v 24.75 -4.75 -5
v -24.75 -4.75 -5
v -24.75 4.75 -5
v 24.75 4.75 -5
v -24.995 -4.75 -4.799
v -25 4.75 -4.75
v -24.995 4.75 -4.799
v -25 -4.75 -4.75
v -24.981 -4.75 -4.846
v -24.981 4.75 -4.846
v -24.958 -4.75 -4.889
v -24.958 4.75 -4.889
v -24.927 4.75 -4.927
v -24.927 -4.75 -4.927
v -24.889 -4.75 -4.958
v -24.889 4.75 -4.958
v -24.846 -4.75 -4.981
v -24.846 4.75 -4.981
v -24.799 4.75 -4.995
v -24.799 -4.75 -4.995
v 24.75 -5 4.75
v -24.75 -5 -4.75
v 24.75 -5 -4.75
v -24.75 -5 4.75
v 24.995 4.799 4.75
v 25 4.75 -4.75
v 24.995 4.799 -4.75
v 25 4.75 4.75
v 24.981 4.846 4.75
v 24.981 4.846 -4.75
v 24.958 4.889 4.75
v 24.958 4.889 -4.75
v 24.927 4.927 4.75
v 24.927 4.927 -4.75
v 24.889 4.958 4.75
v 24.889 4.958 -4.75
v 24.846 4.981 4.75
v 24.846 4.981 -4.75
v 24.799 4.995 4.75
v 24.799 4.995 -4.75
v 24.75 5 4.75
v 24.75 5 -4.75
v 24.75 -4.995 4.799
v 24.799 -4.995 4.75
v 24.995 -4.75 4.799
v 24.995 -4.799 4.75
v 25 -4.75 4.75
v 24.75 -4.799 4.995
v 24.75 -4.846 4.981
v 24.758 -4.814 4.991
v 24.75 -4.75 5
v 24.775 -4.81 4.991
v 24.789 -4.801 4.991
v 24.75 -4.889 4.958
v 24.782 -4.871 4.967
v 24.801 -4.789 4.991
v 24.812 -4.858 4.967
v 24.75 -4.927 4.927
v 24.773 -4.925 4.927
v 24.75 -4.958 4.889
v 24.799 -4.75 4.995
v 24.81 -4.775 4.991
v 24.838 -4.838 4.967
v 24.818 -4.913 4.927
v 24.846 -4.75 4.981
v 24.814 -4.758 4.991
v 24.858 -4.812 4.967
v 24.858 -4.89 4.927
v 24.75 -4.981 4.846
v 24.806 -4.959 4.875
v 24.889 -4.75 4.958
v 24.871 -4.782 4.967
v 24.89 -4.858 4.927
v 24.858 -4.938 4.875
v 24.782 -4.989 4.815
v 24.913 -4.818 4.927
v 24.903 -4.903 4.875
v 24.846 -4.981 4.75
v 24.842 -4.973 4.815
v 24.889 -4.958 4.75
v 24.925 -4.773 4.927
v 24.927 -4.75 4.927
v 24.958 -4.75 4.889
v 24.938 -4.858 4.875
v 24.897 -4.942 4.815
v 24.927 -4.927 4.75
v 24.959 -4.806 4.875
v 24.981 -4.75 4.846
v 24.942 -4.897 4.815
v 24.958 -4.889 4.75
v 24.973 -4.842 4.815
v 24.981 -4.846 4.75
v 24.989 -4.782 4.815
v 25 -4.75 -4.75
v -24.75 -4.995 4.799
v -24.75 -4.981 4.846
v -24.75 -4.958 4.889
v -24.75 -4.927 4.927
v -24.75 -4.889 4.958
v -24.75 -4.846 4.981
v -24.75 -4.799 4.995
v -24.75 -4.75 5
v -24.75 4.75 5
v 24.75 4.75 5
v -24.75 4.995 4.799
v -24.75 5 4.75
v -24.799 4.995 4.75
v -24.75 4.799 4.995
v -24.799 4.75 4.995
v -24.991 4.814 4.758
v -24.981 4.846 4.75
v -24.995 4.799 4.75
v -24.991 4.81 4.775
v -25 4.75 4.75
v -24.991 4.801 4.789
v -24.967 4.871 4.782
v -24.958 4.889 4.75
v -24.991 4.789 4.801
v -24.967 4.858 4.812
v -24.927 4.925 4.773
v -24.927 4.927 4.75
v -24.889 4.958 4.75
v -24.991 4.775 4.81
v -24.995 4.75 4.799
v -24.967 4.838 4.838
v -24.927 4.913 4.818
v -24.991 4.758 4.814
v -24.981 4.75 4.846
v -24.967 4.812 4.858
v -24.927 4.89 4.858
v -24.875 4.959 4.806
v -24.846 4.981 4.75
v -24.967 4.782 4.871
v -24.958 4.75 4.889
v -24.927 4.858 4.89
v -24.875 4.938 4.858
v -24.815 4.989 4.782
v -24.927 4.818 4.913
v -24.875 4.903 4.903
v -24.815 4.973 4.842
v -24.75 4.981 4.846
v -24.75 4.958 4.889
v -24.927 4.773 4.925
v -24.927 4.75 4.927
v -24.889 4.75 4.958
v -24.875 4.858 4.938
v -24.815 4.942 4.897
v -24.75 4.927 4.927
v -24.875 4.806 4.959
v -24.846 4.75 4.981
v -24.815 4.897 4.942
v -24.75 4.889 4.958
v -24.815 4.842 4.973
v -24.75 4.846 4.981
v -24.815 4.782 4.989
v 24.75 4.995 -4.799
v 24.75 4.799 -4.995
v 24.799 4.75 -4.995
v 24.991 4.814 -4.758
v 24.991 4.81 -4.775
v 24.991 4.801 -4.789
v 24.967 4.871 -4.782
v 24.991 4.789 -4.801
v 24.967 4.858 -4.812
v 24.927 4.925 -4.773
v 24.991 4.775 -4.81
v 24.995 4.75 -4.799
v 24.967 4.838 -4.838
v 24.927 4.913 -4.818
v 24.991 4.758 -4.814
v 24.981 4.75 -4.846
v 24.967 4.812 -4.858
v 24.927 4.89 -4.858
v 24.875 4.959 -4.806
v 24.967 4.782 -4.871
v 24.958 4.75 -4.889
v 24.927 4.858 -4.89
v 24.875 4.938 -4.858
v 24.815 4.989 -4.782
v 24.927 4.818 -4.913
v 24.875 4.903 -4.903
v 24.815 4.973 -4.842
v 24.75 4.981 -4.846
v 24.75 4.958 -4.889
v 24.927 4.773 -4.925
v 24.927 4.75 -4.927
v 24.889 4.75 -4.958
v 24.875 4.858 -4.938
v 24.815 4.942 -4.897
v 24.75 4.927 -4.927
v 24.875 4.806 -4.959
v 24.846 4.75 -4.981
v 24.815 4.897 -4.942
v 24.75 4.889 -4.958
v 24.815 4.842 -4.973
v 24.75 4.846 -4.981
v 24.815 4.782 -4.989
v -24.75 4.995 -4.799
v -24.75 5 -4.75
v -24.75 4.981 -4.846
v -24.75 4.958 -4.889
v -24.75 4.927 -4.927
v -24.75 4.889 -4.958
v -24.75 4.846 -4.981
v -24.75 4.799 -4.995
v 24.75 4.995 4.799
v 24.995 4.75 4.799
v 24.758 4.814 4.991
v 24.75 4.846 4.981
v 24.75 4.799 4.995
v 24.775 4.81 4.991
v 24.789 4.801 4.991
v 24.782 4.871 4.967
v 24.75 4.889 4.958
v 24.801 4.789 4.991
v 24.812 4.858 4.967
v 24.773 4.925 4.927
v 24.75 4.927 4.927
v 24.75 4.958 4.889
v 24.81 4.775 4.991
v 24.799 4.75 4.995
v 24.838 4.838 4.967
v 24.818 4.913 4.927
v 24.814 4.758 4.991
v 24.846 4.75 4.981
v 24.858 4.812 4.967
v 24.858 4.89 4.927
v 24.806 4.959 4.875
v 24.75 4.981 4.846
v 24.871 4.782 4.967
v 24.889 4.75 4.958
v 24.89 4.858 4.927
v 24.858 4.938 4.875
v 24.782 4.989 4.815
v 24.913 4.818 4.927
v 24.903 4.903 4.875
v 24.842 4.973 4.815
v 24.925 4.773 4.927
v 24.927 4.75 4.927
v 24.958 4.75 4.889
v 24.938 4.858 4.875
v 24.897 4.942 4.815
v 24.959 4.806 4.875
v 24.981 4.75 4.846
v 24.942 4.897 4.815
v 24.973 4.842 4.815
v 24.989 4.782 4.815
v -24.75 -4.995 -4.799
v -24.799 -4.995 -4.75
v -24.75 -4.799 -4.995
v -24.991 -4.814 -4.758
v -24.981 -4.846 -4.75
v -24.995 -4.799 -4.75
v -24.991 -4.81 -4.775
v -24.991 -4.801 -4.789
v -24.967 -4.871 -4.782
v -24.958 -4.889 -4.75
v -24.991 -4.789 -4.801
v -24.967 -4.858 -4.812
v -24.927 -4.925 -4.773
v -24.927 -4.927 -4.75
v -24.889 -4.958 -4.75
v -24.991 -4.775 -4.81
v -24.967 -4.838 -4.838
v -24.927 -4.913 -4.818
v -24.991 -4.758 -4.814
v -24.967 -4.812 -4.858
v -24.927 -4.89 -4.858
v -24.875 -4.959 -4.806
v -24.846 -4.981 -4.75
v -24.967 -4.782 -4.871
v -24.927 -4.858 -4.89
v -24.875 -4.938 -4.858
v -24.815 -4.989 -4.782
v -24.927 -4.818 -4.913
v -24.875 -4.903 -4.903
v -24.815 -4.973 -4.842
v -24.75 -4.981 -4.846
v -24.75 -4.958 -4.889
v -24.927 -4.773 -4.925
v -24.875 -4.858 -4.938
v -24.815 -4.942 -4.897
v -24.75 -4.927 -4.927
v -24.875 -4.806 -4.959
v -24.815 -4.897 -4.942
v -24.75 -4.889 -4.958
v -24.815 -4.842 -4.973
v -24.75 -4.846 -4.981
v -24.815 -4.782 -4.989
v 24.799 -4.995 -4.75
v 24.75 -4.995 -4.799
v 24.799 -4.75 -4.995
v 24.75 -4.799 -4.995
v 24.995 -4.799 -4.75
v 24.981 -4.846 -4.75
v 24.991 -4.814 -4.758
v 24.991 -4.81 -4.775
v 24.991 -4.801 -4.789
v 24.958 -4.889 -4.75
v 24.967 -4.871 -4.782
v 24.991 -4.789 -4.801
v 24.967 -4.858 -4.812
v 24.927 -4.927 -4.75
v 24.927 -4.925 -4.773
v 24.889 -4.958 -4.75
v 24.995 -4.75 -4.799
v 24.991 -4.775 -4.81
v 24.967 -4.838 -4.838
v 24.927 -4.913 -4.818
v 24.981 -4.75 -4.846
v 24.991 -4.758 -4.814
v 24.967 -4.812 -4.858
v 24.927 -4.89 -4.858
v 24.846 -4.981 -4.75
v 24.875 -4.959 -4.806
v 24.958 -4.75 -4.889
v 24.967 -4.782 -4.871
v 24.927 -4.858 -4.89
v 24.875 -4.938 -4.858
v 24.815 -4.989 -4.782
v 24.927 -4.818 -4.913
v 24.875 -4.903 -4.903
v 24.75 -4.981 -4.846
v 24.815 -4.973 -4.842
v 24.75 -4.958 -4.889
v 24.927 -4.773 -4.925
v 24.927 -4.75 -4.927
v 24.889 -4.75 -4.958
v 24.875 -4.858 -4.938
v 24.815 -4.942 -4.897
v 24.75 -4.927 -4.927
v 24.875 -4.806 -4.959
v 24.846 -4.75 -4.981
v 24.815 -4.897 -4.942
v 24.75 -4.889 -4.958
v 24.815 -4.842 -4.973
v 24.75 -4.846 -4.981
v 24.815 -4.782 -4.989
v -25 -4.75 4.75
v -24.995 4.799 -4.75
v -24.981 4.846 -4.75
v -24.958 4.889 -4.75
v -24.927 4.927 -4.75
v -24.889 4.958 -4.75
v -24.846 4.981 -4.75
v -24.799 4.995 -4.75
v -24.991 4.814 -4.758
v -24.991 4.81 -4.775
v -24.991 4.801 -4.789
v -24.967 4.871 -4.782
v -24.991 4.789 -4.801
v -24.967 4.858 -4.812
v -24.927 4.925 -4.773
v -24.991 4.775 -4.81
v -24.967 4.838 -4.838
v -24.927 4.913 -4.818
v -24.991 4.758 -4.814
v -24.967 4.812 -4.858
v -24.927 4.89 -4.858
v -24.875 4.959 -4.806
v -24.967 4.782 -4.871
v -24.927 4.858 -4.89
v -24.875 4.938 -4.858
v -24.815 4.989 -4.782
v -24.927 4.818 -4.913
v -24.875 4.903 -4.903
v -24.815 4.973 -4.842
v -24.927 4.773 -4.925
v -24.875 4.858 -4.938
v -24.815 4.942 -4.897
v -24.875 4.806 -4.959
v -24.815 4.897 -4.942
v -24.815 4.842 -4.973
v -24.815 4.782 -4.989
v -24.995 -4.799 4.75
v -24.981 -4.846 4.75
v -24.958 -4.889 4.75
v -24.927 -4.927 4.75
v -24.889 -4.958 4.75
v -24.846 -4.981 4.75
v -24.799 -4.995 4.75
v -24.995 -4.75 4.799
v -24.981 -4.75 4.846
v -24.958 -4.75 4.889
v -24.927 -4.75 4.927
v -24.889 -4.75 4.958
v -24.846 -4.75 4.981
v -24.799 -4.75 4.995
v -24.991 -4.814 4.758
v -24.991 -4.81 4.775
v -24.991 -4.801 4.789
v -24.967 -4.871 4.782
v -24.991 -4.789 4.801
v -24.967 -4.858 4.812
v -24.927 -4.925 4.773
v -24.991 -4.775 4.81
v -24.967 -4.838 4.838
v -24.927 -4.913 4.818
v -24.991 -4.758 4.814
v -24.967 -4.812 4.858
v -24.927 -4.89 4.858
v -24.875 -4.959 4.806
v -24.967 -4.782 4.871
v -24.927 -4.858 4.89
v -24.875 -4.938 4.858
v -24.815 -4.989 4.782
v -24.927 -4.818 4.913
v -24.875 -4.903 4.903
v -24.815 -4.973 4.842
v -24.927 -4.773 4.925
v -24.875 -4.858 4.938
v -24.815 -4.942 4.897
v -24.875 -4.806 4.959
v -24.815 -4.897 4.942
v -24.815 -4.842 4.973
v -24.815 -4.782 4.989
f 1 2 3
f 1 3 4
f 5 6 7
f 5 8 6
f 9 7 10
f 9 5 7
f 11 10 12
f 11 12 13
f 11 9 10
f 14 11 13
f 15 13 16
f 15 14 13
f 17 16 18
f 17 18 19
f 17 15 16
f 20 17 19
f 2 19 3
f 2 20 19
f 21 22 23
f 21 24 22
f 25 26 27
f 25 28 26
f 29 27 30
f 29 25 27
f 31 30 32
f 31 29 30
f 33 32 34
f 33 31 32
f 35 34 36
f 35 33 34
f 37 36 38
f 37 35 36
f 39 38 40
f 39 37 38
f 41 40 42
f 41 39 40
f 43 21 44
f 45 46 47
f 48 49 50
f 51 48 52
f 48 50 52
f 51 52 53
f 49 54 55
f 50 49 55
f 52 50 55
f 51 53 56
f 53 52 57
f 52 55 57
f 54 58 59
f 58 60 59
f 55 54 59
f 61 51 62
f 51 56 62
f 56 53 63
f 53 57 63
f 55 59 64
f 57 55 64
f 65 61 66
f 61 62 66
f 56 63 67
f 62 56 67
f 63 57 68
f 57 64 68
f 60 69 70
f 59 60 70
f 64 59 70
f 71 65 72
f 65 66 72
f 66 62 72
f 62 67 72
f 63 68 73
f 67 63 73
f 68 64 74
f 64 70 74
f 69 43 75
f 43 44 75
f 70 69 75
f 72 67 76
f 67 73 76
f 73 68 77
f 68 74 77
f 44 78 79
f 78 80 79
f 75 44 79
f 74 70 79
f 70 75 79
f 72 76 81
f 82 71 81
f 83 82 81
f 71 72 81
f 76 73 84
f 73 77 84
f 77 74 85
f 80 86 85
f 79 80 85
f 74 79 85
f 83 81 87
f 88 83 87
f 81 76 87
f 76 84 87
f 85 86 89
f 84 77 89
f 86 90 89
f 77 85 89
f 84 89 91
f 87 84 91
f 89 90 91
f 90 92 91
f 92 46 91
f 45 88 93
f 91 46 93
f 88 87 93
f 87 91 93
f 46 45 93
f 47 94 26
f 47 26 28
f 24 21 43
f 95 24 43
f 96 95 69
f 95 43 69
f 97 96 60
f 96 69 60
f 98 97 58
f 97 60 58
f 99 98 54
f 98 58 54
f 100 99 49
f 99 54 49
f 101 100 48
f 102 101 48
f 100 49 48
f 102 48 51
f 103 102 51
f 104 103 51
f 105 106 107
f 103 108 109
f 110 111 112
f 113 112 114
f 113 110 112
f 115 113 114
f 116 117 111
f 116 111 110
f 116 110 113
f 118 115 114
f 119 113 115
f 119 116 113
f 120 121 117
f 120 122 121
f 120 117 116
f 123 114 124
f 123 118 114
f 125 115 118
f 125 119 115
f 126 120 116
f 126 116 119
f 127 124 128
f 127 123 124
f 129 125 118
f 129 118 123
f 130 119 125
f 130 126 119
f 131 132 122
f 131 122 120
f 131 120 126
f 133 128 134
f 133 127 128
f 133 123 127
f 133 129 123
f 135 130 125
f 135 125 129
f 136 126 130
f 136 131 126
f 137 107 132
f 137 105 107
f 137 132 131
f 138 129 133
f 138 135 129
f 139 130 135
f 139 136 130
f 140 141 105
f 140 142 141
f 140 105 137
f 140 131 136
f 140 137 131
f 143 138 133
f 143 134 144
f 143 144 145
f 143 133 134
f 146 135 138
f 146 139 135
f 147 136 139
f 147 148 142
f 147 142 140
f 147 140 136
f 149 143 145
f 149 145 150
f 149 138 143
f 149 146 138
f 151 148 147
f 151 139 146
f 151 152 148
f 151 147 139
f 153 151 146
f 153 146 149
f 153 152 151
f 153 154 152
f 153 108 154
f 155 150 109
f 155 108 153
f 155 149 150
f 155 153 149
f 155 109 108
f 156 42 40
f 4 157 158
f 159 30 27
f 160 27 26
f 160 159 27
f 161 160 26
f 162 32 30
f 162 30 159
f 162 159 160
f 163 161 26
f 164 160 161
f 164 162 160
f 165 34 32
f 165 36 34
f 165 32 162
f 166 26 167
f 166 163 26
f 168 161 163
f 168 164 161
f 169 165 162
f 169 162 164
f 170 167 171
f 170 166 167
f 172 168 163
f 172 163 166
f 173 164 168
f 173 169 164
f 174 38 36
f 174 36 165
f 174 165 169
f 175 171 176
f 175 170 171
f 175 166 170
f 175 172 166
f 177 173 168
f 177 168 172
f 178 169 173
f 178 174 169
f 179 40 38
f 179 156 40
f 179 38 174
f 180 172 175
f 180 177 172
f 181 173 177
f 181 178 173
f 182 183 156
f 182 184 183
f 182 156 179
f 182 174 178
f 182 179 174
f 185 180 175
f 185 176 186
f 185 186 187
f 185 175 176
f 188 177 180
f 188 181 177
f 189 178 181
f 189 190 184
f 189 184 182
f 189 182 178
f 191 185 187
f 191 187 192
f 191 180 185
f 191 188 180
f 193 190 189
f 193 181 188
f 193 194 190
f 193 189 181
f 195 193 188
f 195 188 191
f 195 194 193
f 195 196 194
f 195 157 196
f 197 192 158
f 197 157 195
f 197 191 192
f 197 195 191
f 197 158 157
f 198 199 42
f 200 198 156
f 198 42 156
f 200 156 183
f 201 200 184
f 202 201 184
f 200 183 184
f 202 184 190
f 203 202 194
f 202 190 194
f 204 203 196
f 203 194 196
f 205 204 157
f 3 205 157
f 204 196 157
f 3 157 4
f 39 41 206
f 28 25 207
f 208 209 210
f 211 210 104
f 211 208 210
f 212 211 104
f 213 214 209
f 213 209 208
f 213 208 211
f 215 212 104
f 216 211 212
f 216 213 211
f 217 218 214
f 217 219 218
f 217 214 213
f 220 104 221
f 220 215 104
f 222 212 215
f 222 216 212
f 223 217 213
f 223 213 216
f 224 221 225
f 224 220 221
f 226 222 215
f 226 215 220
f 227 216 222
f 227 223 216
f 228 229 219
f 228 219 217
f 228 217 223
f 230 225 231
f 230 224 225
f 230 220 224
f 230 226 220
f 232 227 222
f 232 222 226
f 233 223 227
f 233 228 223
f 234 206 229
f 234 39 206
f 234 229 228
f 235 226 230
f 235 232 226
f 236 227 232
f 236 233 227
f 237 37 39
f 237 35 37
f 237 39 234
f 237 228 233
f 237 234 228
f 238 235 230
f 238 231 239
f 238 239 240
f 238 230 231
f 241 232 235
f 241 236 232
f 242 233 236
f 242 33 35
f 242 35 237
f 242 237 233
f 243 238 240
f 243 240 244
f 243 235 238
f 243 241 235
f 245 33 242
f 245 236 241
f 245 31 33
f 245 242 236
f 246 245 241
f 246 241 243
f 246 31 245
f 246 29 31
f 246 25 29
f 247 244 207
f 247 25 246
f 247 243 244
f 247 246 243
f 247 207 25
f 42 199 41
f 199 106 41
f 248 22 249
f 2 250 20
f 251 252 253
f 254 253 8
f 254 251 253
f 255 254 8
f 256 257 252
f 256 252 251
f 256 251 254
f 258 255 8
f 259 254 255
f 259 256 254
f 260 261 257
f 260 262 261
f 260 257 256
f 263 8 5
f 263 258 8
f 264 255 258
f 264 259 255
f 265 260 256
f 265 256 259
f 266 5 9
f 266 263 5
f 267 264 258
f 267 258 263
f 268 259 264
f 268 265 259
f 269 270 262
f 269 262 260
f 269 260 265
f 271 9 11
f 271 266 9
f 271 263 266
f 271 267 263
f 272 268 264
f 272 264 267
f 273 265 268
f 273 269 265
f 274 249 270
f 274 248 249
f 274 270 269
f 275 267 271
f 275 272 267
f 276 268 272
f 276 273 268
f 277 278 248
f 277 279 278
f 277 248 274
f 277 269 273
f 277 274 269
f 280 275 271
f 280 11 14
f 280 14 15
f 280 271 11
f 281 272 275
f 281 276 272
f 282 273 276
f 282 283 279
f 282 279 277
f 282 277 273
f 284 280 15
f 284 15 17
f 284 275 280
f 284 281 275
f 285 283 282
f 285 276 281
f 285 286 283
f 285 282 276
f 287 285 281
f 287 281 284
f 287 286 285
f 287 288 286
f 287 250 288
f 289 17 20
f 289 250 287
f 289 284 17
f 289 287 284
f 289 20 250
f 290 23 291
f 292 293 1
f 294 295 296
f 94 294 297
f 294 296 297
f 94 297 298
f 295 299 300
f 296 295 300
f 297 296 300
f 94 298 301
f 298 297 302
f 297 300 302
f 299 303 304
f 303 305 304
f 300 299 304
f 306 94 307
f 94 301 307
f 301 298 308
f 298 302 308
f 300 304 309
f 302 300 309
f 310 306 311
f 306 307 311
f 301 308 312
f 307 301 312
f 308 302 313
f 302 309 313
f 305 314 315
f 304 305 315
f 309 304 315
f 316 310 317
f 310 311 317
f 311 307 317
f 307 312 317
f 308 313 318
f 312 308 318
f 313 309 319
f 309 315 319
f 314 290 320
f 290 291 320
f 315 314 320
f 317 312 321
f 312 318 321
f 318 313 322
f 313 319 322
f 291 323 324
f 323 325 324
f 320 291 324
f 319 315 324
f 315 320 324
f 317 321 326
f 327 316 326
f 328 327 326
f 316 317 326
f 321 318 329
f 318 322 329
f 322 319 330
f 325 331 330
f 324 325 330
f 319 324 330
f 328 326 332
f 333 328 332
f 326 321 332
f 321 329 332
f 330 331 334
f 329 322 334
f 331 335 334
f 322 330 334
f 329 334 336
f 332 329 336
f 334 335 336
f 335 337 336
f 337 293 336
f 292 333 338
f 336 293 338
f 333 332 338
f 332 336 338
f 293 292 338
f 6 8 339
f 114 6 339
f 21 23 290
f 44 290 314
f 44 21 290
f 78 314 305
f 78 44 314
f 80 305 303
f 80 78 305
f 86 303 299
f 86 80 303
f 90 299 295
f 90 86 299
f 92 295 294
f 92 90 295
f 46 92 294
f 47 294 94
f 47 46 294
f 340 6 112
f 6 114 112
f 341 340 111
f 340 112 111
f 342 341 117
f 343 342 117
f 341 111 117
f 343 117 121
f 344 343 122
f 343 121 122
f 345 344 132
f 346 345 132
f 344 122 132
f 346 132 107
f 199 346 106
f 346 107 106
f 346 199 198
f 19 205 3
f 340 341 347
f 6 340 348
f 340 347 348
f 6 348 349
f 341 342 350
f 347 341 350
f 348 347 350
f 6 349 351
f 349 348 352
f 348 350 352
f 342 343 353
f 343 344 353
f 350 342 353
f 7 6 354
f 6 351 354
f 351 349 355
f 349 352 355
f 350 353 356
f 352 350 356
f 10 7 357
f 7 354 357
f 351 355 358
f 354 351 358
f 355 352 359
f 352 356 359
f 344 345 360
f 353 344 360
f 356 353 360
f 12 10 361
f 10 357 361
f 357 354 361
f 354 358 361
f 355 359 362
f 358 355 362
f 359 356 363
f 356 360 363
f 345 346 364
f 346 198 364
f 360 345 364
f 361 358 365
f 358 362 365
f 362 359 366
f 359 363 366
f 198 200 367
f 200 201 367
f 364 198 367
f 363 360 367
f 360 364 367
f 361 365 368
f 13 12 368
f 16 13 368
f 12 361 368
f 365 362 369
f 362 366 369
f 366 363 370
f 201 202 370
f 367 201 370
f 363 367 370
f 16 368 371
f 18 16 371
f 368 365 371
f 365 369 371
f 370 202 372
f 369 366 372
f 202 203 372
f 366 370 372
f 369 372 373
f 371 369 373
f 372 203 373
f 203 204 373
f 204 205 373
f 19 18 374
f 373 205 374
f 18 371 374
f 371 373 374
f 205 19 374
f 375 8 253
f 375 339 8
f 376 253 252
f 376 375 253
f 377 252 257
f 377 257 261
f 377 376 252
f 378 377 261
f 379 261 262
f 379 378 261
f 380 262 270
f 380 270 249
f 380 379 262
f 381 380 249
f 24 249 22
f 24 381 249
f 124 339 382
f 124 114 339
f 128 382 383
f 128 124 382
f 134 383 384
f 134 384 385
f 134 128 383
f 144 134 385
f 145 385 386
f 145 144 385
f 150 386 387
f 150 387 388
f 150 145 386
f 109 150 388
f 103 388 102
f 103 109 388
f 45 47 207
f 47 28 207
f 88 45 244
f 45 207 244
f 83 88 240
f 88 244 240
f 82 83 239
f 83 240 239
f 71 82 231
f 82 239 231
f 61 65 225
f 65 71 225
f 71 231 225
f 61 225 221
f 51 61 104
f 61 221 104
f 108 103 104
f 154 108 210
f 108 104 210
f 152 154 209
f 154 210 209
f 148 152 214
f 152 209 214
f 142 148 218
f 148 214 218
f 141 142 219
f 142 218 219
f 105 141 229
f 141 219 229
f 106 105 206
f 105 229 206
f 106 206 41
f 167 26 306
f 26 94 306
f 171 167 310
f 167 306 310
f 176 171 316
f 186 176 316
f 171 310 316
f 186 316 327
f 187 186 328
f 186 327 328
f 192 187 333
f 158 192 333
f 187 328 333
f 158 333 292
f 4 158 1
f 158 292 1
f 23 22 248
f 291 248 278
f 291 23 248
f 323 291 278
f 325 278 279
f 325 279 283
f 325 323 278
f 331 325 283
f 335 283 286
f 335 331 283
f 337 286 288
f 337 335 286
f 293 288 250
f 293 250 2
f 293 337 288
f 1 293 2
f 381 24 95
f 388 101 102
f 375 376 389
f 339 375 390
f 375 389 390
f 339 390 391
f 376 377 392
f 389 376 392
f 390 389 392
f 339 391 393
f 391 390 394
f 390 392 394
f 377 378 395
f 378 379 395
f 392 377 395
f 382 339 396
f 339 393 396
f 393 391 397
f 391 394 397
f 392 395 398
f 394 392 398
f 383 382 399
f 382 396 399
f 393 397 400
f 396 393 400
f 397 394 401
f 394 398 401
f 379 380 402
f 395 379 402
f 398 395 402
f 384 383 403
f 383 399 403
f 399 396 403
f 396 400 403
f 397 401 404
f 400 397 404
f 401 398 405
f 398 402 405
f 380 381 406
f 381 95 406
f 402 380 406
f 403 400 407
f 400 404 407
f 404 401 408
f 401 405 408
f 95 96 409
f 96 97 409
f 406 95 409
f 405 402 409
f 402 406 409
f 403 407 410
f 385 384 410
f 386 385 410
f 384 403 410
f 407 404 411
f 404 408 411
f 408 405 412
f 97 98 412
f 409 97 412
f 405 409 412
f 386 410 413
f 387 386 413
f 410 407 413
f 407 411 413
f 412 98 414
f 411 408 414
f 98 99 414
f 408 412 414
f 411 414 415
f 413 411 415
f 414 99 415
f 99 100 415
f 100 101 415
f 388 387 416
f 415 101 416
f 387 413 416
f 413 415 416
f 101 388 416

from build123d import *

# Parameters (mm, degrees)
F0_W          = 50
F0_H          = 10
F1_DEPTH      = 5
F1_DEPTH_BACK = 5
F2_R          = 0.25


with BuildPart() as f1:
    # F0 (on Front) → F1 (new body, two sides)
    with BuildSketch(Plane.XZ) as f1_sk:
        Rectangle(F0_W, F0_H)
    extrude(amount=F1_DEPTH)
    extrude(f1_sk.sketch, amount=-F1_DEPTH_BACK)

    # F2
    f2_edges = [f1.edges().sort_by_distance(p)[0] for p in [
        (0, -5, -5),
        (25, -5, 0),
        (0, -5, 5),
        (-25, -5, 0),
        (0, 5, -5),
        (25, 5, 0),
        (0, 5, 5),
        (-25, 5, 0),
        (25, 0, 5),
        (25, 0, -5),
        (-25, 0, 5),
        (-25, 0, -5),
    ]]
    fillet(f2_edges, radius=F2_R)


solid = f1.part
